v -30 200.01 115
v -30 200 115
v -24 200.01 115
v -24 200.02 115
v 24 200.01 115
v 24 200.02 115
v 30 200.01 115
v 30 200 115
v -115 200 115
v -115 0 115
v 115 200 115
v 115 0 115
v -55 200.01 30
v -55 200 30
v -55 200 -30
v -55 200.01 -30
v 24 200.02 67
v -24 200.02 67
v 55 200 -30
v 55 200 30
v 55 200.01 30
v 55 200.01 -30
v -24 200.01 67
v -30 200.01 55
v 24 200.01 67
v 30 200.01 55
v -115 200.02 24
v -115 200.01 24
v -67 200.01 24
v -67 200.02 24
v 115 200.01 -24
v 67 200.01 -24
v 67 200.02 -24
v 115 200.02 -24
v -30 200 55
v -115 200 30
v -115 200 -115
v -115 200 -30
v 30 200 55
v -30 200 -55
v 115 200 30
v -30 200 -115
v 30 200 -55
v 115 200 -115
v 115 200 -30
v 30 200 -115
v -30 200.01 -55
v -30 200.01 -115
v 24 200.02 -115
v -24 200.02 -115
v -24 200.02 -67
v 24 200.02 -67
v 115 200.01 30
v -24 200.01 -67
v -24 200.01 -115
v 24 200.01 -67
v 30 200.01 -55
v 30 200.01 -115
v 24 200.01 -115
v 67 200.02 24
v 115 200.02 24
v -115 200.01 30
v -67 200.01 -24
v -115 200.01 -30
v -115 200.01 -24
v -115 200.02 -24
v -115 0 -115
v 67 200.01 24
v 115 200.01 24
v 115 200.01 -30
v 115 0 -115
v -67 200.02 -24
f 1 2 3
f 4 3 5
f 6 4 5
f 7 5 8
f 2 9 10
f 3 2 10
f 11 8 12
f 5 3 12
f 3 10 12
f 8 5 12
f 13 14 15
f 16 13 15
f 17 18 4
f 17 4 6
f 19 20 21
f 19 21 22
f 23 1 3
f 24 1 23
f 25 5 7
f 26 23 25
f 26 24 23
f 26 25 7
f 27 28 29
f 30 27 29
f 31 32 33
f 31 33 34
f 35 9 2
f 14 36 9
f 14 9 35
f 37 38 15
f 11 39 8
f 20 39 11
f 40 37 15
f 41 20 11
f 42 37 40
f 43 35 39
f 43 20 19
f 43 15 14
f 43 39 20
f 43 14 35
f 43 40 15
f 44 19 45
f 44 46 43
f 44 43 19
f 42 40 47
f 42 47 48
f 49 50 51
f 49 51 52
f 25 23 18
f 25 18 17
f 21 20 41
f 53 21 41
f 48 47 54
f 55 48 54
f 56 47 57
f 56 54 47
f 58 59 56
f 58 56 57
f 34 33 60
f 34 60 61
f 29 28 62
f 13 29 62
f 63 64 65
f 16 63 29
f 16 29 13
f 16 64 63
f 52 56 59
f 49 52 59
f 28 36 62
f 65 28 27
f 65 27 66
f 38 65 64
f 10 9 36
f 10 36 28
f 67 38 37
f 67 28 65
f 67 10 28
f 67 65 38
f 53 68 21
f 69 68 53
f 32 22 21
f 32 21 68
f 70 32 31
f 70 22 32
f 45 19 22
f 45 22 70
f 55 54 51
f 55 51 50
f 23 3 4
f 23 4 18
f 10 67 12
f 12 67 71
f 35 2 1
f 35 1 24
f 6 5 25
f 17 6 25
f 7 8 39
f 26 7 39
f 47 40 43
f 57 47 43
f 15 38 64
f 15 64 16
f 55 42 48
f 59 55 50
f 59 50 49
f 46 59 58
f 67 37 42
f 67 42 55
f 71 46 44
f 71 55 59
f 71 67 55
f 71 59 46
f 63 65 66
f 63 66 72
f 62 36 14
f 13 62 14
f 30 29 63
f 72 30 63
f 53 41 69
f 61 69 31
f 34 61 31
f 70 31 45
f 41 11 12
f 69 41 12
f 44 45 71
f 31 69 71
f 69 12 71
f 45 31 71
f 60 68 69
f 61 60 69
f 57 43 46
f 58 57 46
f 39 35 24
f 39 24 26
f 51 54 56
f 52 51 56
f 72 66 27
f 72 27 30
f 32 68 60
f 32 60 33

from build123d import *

# Parameters (mm, degrees)
SKETCH1_W           = 230
SKETCH1_H           = 230
BOSS_EXTRUDE1_DEPTH = 200
SKETCH3_W           = 60
SKETCH3_H           = 60
BOSS_EXTRUDE2_DEPTH = 0.01
SKETCH5_W           = 48
SKETCH5_H           = 48
BOSS_EXTRUDE3_DEPTH = 0.01


with BuildPart() as part:
    # Sketch1 → Boss-Extrude1 (new body)
    with BuildSketch(Plane(origin=(0, 0, 0), x_dir=(1, 0, 0), z_dir=(0, 1, 0))):
        Rectangle(SKETCH1_W, SKETCH1_H)
    extrude(amount=BOSS_EXTRUDE1_DEPTH)

    # Sketch3 → Boss-Extrude2 (add)
    with BuildSketch(Plane(origin=(0, 200, 0), x_dir=(1, 0, 0), z_dir=(0, 1, 0))):
        with Locations((85, 0)):
            Rectangle(SKETCH3_W, SKETCH3_H)
        with Locations((0, 85)):
            Rectangle(SKETCH3_W, SKETCH3_H)
        with Locations((0, -85)):
            Rectangle(SKETCH3_W, SKETCH3_H)
        with Locations((-85, 0)):
            Rectangle(SKETCH3_W, SKETCH3_H)
    extrude(amount=BOSS_EXTRUDE2_DEPTH)

    # Sketch5 → Boss-Extrude3 (add)
    with BuildSketch(Plane(origin=(0, 200.01, 0), x_dir=(1, 0, 0), z_dir=(0, 1, 0))):
        with Locations((0, 91)):
            Rectangle(SKETCH5_W, SKETCH5_H)
        with Locations((91, 0)):
            Rectangle(SKETCH5_W, SKETCH5_H)
        with Locations((0, -91)):
            Rectangle(SKETCH5_W, SKETCH5_H)
        with Locations((-91, 0)):
            Rectangle(SKETCH5_W, SKETCH5_H)
    extrude(amount=BOSS_EXTRUDE3_DEPTH)


solid = part.part
